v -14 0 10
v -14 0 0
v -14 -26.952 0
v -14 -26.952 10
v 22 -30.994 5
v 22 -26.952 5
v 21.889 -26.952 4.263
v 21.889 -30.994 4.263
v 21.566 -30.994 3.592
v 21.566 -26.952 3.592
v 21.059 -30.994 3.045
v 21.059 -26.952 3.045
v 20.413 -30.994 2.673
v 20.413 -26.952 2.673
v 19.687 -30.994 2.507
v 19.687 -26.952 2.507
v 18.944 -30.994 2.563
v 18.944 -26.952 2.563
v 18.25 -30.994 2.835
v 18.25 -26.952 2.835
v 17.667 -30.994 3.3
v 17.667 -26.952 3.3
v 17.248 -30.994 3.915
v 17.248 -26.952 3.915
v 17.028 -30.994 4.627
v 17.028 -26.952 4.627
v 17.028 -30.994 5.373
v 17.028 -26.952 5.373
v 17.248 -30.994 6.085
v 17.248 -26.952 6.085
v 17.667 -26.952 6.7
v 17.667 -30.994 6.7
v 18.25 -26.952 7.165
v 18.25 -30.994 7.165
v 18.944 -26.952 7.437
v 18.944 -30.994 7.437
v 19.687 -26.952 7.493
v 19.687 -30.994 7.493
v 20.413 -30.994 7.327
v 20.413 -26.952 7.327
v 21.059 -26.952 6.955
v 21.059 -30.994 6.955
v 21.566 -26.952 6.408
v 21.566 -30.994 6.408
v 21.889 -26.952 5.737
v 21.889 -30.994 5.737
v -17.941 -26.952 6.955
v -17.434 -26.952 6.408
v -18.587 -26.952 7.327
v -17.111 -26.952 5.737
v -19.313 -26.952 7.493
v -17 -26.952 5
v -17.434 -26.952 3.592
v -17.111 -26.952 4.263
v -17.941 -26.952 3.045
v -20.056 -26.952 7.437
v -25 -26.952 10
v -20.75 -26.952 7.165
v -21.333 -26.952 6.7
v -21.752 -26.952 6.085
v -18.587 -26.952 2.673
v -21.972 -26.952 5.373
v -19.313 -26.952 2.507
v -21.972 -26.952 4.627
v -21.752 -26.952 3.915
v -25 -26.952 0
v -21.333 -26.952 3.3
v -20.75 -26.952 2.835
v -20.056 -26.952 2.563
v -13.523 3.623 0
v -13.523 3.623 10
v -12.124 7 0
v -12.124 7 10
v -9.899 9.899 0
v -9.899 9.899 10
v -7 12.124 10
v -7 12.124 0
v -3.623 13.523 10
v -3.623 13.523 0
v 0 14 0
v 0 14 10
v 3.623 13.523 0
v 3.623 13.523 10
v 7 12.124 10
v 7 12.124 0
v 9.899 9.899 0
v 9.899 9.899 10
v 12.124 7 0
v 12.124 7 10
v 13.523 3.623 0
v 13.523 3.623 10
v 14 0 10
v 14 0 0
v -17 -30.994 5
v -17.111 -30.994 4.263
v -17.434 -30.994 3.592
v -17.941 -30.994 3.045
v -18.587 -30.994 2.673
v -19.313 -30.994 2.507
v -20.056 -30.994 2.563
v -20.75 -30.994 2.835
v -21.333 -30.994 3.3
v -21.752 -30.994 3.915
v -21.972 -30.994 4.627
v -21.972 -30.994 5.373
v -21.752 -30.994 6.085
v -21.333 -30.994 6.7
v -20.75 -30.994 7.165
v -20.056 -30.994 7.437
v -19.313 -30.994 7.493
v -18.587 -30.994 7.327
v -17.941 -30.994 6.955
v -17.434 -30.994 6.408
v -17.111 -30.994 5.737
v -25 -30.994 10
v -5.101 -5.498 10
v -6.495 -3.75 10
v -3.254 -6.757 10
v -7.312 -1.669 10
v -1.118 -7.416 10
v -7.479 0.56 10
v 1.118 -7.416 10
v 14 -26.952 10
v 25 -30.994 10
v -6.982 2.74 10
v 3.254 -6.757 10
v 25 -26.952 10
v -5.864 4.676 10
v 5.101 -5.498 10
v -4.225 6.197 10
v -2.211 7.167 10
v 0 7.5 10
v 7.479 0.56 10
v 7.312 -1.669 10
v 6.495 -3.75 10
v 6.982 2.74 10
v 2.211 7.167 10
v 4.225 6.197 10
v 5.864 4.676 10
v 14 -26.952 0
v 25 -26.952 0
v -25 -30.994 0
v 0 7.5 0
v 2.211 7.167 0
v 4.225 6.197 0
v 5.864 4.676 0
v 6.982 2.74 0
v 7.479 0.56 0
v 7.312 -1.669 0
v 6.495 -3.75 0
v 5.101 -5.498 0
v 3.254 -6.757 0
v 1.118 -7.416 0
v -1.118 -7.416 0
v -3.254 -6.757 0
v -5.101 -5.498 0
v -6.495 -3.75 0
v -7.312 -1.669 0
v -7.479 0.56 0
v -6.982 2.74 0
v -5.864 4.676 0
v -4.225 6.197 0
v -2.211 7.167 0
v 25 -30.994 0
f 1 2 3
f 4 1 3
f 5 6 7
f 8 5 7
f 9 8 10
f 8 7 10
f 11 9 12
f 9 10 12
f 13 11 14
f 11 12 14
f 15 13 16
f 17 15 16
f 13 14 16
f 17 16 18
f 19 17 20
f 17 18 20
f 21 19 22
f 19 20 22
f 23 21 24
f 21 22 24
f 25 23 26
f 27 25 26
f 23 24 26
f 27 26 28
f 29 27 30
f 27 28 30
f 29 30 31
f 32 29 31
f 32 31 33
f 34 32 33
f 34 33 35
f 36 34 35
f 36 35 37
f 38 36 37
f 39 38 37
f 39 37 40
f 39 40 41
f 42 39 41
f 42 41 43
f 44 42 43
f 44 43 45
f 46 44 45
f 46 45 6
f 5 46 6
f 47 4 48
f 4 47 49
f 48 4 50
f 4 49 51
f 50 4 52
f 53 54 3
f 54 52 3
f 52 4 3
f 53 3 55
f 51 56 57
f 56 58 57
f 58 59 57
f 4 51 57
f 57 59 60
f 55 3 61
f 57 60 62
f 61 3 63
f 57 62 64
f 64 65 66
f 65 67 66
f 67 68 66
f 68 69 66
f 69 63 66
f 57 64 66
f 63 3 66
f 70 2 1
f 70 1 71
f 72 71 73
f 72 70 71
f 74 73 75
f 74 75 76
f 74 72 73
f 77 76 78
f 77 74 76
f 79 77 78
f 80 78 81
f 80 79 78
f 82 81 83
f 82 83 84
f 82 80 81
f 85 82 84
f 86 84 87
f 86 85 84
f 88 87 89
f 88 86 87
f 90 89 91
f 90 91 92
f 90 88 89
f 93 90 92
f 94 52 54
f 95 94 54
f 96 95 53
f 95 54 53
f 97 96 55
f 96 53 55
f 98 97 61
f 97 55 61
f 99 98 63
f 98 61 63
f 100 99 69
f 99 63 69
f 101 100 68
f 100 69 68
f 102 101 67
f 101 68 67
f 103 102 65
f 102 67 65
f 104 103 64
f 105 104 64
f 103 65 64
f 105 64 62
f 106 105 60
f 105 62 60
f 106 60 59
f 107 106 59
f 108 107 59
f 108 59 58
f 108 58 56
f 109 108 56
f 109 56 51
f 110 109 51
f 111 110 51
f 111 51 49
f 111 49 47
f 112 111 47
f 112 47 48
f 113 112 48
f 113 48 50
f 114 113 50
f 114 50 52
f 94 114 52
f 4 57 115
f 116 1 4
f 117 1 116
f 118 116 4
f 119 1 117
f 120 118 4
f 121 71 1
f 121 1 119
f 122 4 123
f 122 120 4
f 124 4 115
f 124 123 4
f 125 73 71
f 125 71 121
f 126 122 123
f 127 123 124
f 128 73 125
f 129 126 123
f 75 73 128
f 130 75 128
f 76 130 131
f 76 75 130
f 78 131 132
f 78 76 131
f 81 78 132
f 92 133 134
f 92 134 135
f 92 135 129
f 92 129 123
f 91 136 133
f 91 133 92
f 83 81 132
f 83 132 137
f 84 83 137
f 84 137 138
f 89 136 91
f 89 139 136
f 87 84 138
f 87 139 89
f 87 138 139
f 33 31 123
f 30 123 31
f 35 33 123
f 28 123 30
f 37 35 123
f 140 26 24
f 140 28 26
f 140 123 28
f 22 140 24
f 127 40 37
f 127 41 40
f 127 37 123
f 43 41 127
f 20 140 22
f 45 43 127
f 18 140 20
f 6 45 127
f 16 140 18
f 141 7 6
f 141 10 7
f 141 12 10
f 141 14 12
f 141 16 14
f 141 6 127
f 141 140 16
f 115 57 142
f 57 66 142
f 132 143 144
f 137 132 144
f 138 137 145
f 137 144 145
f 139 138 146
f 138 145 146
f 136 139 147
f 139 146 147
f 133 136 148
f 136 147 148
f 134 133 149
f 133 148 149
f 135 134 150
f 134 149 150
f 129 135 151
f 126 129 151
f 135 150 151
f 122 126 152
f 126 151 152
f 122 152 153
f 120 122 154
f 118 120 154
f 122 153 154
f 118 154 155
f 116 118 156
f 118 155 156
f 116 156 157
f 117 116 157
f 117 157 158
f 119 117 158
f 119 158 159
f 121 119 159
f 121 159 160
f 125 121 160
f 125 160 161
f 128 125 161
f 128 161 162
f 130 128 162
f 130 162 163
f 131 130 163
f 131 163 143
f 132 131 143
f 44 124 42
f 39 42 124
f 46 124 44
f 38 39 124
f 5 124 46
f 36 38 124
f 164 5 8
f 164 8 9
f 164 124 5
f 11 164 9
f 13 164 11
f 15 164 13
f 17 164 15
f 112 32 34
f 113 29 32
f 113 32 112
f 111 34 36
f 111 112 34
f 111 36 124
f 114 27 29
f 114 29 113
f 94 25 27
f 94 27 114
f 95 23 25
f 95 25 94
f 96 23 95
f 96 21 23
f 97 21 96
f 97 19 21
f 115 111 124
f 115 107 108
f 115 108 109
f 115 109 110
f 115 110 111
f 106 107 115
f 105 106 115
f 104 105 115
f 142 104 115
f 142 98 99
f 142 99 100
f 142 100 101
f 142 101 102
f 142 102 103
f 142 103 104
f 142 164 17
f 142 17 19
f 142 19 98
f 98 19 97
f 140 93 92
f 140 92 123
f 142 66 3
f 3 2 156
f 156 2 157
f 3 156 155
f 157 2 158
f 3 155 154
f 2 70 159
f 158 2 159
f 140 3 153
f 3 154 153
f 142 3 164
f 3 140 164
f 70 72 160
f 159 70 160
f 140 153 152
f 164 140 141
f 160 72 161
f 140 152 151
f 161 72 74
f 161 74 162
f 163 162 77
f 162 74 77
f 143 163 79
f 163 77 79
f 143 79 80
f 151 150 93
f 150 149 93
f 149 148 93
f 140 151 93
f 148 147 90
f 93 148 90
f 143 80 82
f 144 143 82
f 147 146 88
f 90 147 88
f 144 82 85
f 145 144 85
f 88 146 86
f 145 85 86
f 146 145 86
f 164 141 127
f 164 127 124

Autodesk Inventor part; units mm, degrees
ref_plane "YZ Plane" through (0, 0, 0) normal (1, 0, 0) x (0, 1, 0)
ref_plane "XZ Plane" through (0, 0, 0) normal (0, 1, 0) x (-1, 0, 0)
ref_plane "XY Plane" through (0, 0, 0) normal (0, 0, 1) x (1, 0, 0)
sketch "Boceto1" plane through (0, 0, 0) normal (0, 0, 1) x (1, 0, 0)
  arc A0 (0, 14) -> (-14, 0) centre (0, 0) ccw
  line L0 (-14, 0) -> (-14, -26.9516)
  line L1 (-14, -26.9516) -> (-25, -26.9516)
  line L2 (-25, -26.9516) -> (-25, -30.9943)
  line L3 (-25, -30.9943) -> (0, -30.9943)
  line L4 (0, -30.9943) -> (0, 14) construction
  arc A1 (0, 7.5) -> (0, -7.5) centre (0, 0) ccw
  arc A2 (14, 0) -> (0, 14) centre (0, 0) ccw
  line L5 (14, 0) -> (14, -26.9516)
  line L6 (14, -26.9516) -> (25, -26.9516)
  line L7 (25, -26.9516) -> (25, -30.9943)
  line L8 (25, -30.9943) -> (0, -30.9943)
  arc A3 (0, -7.5) -> (0, 7.5) centre (0, 0) ccw
  dimension "d2" = 7.5
  dimension "d6" = 50
  dimension "d7" = 28
extrude "Extrusión1" add sketch "Boceto1" along normal blind 10
sketch "Boceto2" plane through (-25, -26.9516, 0) normal (0, 1, 0) x (1, 0, 0)
  line L0 (11, 0) -> (39, 0) projected
  line L1 (0, -10) -> (50, -10) projected
  line L2 (11, 0) -> (0, -10)
  line L3 (11, -10) -> (39, -10) projected
  line L4 (0, 0) -> (50, 0) projected
  line L5 (11, -10) -> (0, 0)
  line L6 (0, 0) -> (50, -10)
  line L7 (0, -10) -> (50, 0)
  line L8 (25, -5) -> (25, 11.6359)
  circle A0 centre (5.5, -5) radius 2.5
  circle A1 centre (44.5, -5) radius 2.5
  point P0 (25, 0)
  dimension "d3" = 5
extrude "Extrusión2" cut sketch "Boceto2" against normal blind 5 contours A0 L5 L2 | L2 L5 A0 | L5 L2 A0 | L5 A0 L2 | A1
properties part number "sopoetellantas"
